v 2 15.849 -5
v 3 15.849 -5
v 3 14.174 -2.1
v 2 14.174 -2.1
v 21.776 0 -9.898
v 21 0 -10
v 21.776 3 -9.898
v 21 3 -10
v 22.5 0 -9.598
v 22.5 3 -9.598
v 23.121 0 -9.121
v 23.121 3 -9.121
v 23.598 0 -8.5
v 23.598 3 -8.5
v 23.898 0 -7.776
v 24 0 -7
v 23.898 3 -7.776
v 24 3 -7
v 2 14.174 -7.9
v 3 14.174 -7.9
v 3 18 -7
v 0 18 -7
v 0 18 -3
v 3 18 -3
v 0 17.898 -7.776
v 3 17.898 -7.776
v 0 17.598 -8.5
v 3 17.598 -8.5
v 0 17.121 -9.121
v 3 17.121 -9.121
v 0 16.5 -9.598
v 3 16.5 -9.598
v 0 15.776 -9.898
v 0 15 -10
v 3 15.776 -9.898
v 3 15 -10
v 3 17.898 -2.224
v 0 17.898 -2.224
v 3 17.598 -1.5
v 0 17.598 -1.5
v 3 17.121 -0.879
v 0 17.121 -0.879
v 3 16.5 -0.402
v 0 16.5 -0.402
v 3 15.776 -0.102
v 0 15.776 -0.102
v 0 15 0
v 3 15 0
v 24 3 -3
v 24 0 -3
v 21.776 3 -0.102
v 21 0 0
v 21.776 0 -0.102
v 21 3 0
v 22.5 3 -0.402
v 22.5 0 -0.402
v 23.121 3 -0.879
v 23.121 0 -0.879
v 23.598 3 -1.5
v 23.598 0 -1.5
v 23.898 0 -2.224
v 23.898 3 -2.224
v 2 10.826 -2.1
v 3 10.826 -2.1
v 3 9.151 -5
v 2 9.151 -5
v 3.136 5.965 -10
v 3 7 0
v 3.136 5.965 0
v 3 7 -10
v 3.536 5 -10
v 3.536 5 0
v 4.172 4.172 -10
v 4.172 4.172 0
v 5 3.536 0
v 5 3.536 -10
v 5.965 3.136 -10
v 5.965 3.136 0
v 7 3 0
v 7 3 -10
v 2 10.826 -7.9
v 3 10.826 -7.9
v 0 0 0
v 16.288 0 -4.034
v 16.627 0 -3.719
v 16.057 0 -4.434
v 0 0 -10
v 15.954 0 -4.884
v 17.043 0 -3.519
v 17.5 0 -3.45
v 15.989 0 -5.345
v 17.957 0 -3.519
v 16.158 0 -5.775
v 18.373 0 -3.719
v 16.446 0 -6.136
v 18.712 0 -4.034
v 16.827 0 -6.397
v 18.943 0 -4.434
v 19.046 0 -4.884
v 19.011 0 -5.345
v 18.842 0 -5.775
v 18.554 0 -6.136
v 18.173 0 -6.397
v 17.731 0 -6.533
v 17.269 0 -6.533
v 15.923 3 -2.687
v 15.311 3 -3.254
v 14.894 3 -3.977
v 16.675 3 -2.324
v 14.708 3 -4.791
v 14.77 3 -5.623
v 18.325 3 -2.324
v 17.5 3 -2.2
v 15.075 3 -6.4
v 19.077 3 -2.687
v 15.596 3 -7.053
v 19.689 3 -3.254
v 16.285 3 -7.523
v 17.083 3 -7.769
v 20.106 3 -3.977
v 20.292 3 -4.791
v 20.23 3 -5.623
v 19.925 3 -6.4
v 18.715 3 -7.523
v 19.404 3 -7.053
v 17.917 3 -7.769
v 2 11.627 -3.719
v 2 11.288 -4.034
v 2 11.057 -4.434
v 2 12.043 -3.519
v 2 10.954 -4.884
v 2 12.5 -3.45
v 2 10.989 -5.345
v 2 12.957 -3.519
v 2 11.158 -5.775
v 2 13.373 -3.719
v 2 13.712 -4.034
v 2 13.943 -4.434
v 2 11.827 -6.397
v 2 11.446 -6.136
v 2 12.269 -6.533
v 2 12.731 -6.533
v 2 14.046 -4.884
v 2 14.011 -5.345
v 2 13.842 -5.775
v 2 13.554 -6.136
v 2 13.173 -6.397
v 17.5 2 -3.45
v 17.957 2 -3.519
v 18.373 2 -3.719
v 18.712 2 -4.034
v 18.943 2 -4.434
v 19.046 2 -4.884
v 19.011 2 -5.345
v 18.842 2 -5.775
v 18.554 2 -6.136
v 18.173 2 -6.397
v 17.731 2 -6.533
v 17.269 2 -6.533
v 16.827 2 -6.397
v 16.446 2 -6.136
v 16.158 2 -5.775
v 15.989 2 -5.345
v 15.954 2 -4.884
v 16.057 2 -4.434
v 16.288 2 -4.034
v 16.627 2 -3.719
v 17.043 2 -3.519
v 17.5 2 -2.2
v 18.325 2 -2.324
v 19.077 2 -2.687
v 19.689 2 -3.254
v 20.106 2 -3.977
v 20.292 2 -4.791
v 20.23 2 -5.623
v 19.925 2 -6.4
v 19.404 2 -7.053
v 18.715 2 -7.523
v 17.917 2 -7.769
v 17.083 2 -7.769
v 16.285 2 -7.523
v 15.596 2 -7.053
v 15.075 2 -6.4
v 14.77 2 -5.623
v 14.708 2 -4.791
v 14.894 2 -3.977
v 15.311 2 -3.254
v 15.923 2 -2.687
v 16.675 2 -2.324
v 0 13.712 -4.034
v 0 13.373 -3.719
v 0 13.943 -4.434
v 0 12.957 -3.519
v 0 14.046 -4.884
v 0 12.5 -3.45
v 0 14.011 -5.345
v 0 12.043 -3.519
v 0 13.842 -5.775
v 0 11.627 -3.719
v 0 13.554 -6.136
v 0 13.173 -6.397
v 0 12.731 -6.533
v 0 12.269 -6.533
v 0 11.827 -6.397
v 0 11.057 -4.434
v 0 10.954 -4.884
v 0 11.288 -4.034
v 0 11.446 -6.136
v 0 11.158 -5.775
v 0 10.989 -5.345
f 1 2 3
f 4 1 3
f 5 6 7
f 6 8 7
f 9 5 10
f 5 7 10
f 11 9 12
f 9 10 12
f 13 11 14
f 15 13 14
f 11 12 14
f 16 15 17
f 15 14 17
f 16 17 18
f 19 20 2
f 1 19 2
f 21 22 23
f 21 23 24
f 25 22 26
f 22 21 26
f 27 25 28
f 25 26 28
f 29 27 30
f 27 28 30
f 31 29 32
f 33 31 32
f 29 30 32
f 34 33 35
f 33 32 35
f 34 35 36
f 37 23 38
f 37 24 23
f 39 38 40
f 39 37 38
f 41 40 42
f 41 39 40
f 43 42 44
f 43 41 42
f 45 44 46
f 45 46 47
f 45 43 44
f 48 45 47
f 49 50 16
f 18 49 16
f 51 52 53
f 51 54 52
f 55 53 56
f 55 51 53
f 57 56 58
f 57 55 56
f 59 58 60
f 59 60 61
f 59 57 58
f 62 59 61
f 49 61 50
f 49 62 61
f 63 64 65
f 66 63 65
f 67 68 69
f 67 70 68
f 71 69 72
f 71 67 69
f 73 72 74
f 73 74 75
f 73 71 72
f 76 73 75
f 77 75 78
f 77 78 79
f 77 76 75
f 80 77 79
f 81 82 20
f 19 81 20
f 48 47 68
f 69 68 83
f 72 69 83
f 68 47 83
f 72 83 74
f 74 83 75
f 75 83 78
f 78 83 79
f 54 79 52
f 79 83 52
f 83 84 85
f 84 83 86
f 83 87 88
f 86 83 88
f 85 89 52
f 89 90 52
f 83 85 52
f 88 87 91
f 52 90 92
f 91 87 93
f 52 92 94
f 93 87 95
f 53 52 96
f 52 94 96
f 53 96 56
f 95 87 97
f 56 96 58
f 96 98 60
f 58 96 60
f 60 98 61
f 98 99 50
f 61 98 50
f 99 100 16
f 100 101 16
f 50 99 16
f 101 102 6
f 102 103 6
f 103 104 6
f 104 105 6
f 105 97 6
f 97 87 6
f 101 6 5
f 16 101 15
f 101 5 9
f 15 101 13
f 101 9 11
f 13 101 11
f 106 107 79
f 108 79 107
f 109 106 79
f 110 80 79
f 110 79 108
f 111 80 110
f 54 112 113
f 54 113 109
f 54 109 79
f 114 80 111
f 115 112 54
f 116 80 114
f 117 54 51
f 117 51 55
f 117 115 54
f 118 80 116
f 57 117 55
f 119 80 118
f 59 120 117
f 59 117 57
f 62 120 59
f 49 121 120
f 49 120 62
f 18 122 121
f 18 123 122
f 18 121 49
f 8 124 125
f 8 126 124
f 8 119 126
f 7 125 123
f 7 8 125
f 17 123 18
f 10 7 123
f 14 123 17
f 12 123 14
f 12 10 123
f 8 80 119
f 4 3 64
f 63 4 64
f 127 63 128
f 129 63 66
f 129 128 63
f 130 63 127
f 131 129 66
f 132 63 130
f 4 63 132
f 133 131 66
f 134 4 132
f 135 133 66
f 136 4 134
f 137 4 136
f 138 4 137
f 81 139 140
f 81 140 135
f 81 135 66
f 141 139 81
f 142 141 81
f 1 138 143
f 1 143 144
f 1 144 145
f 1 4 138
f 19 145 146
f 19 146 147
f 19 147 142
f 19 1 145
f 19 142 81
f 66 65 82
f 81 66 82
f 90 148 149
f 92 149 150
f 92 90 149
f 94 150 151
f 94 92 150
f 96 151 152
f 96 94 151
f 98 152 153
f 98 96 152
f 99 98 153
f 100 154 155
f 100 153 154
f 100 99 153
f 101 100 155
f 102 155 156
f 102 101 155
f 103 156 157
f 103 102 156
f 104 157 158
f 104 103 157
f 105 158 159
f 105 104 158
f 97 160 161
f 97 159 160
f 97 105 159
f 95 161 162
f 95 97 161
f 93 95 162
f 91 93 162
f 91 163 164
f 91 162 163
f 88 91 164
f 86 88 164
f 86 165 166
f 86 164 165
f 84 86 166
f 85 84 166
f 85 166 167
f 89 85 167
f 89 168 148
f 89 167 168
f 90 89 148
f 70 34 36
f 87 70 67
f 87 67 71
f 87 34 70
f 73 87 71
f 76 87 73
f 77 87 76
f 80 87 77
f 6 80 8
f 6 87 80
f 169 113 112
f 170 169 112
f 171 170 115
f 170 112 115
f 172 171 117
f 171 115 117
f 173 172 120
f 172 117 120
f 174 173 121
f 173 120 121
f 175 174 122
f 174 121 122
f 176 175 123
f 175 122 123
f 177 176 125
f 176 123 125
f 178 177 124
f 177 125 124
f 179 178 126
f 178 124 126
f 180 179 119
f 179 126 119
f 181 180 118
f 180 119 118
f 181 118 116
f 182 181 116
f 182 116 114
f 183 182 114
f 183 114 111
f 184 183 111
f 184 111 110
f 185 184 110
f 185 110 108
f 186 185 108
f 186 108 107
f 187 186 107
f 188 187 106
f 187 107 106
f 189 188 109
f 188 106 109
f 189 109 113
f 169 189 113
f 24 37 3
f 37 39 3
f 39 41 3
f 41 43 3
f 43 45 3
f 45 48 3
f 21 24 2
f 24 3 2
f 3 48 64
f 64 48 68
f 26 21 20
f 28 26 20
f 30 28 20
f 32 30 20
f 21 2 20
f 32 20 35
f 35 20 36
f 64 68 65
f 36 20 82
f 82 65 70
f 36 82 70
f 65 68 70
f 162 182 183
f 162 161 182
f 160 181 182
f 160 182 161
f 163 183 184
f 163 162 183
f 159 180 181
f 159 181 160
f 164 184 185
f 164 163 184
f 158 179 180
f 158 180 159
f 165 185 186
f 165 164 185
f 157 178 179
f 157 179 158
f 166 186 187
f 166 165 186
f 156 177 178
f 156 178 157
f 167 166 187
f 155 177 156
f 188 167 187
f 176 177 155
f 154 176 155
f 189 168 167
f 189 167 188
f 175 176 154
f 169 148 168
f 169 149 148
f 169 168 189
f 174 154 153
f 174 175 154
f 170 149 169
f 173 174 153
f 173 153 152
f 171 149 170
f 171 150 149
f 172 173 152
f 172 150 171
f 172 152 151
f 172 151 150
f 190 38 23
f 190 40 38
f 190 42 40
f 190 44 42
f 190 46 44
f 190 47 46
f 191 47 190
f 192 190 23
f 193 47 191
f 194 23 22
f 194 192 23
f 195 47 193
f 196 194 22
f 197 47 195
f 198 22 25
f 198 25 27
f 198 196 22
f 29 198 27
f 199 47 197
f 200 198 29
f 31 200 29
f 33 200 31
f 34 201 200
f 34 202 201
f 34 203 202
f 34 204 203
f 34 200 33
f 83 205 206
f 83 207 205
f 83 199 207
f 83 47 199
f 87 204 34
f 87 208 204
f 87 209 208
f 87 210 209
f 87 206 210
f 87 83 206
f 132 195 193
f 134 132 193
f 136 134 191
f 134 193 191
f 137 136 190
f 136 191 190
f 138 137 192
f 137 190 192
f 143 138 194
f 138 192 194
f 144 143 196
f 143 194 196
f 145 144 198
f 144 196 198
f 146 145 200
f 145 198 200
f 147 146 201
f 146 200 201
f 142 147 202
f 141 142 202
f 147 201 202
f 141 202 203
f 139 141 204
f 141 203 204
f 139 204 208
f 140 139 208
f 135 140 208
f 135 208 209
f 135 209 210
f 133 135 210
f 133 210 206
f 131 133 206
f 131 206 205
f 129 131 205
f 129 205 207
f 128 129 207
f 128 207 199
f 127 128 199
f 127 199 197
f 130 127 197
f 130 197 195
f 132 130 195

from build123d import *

# Parameters (mm, degrees)
CROQUIS1_W              = 24
CROQUIS1_H              = 10
CROQUIS1_R              = 1.55
SALIENTE_EXTRUIR1_DEPTH = 3
CROQUIS2_W              = 3
CROQUIS2_H              = 10
SALIENTE_EXTRUIR2_DEPTH = 15
CROQUIS3_R              = 1.55
CORTAR_EXTRUIR1_DEPTH   = 3
CROQUIS4_R              = 2.8
CORTAR_EXTRUIR2_DEPTH   = 1
CORTAR_EXTRUIR3_DEPTH   = 1
REDONDEO1_R             = 3
REDONDEO2_R             = 4


with BuildPart() as part:
    # Croquis1 → Saliente-Extruir1 (new body)
    with BuildSketch(Plane(origin=(0, 0, 0), x_dir=(1, 0, 0), z_dir=(0, 1, 0))):
        with Locations((12, 5)):
            Rectangle(CROQUIS1_W, CROQUIS1_H)
        with Locations(Location((17.5, 5, 0), (0, 0, 270))):
            Circle(CROQUIS1_R, mode=Mode.SUBTRACT)
    extrude(amount=SALIENTE_EXTRUIR1_DEPTH)

    # Croquis2 → Saliente-Extruir2 (add)
    with BuildSketch(Plane(origin=(0, 3, 0), x_dir=(1, 0, 0), z_dir=(0, 1, 0))):
        with Locations((1.5, 5)):
            Rectangle(CROQUIS2_W, CROQUIS2_H)
    extrude(amount=SALIENTE_EXTRUIR2_DEPTH)

    # Croquis3 → Cortar-Extruir1 (cut)
    with BuildSketch(Plane.ZY):
        with Locations((-5, 12.5)):
            Circle(CROQUIS3_R)
    extrude(amount=-CORTAR_EXTRUIR1_DEPTH, mode=Mode.SUBTRACT)

    # Croquis4 → Cortar-Extruir2 (cut)
    with BuildSketch(Plane(origin=(0, 3, 0), x_dir=(1, 0, 0), z_dir=(0, 1, 0))):
        with Locations(Location((17.5, 5, 0), (0, 0, 270))):
            Circle(CROQUIS4_R)
    extrude(amount=-CORTAR_EXTRUIR2_DEPTH, mode=Mode.SUBTRACT)

    # Croquis5 → Cortar-Extruir3 (cut)
    with BuildSketch(Plane(origin=(3, 0, 0), x_dir=(0, 0, -1), z_dir=(1, 0, 0))):
        Polygon((7.9, 14.174315781), (5, 15.848631561), (2.1, 14.174315781), (2.1, 10.825684219), (5, 9.151368439), (7.9, 10.825684219), align=None)
    extrude(amount=-CORTAR_EXTRUIR3_DEPTH, mode=Mode.SUBTRACT)

    # Redondeo1
    redondeo1_edges = [part.edges().sort_by_distance(p)[0] for p in [
        (1.5, 18, 0),
        (1.5, 18, -10),
        (24, 1.5, -10),
        (24, 1.5, 0),
    ]]
    fillet(redondeo1_edges, radius=REDONDEO1_R)

    # Redondeo2
    redondeo2_edges = [part.edges().sort_by_distance(p)[0] for p in [
        (3, 3, -5),
    ]]
    fillet(redondeo2_edges, radius=REDONDEO2_R)


solid = part.part
